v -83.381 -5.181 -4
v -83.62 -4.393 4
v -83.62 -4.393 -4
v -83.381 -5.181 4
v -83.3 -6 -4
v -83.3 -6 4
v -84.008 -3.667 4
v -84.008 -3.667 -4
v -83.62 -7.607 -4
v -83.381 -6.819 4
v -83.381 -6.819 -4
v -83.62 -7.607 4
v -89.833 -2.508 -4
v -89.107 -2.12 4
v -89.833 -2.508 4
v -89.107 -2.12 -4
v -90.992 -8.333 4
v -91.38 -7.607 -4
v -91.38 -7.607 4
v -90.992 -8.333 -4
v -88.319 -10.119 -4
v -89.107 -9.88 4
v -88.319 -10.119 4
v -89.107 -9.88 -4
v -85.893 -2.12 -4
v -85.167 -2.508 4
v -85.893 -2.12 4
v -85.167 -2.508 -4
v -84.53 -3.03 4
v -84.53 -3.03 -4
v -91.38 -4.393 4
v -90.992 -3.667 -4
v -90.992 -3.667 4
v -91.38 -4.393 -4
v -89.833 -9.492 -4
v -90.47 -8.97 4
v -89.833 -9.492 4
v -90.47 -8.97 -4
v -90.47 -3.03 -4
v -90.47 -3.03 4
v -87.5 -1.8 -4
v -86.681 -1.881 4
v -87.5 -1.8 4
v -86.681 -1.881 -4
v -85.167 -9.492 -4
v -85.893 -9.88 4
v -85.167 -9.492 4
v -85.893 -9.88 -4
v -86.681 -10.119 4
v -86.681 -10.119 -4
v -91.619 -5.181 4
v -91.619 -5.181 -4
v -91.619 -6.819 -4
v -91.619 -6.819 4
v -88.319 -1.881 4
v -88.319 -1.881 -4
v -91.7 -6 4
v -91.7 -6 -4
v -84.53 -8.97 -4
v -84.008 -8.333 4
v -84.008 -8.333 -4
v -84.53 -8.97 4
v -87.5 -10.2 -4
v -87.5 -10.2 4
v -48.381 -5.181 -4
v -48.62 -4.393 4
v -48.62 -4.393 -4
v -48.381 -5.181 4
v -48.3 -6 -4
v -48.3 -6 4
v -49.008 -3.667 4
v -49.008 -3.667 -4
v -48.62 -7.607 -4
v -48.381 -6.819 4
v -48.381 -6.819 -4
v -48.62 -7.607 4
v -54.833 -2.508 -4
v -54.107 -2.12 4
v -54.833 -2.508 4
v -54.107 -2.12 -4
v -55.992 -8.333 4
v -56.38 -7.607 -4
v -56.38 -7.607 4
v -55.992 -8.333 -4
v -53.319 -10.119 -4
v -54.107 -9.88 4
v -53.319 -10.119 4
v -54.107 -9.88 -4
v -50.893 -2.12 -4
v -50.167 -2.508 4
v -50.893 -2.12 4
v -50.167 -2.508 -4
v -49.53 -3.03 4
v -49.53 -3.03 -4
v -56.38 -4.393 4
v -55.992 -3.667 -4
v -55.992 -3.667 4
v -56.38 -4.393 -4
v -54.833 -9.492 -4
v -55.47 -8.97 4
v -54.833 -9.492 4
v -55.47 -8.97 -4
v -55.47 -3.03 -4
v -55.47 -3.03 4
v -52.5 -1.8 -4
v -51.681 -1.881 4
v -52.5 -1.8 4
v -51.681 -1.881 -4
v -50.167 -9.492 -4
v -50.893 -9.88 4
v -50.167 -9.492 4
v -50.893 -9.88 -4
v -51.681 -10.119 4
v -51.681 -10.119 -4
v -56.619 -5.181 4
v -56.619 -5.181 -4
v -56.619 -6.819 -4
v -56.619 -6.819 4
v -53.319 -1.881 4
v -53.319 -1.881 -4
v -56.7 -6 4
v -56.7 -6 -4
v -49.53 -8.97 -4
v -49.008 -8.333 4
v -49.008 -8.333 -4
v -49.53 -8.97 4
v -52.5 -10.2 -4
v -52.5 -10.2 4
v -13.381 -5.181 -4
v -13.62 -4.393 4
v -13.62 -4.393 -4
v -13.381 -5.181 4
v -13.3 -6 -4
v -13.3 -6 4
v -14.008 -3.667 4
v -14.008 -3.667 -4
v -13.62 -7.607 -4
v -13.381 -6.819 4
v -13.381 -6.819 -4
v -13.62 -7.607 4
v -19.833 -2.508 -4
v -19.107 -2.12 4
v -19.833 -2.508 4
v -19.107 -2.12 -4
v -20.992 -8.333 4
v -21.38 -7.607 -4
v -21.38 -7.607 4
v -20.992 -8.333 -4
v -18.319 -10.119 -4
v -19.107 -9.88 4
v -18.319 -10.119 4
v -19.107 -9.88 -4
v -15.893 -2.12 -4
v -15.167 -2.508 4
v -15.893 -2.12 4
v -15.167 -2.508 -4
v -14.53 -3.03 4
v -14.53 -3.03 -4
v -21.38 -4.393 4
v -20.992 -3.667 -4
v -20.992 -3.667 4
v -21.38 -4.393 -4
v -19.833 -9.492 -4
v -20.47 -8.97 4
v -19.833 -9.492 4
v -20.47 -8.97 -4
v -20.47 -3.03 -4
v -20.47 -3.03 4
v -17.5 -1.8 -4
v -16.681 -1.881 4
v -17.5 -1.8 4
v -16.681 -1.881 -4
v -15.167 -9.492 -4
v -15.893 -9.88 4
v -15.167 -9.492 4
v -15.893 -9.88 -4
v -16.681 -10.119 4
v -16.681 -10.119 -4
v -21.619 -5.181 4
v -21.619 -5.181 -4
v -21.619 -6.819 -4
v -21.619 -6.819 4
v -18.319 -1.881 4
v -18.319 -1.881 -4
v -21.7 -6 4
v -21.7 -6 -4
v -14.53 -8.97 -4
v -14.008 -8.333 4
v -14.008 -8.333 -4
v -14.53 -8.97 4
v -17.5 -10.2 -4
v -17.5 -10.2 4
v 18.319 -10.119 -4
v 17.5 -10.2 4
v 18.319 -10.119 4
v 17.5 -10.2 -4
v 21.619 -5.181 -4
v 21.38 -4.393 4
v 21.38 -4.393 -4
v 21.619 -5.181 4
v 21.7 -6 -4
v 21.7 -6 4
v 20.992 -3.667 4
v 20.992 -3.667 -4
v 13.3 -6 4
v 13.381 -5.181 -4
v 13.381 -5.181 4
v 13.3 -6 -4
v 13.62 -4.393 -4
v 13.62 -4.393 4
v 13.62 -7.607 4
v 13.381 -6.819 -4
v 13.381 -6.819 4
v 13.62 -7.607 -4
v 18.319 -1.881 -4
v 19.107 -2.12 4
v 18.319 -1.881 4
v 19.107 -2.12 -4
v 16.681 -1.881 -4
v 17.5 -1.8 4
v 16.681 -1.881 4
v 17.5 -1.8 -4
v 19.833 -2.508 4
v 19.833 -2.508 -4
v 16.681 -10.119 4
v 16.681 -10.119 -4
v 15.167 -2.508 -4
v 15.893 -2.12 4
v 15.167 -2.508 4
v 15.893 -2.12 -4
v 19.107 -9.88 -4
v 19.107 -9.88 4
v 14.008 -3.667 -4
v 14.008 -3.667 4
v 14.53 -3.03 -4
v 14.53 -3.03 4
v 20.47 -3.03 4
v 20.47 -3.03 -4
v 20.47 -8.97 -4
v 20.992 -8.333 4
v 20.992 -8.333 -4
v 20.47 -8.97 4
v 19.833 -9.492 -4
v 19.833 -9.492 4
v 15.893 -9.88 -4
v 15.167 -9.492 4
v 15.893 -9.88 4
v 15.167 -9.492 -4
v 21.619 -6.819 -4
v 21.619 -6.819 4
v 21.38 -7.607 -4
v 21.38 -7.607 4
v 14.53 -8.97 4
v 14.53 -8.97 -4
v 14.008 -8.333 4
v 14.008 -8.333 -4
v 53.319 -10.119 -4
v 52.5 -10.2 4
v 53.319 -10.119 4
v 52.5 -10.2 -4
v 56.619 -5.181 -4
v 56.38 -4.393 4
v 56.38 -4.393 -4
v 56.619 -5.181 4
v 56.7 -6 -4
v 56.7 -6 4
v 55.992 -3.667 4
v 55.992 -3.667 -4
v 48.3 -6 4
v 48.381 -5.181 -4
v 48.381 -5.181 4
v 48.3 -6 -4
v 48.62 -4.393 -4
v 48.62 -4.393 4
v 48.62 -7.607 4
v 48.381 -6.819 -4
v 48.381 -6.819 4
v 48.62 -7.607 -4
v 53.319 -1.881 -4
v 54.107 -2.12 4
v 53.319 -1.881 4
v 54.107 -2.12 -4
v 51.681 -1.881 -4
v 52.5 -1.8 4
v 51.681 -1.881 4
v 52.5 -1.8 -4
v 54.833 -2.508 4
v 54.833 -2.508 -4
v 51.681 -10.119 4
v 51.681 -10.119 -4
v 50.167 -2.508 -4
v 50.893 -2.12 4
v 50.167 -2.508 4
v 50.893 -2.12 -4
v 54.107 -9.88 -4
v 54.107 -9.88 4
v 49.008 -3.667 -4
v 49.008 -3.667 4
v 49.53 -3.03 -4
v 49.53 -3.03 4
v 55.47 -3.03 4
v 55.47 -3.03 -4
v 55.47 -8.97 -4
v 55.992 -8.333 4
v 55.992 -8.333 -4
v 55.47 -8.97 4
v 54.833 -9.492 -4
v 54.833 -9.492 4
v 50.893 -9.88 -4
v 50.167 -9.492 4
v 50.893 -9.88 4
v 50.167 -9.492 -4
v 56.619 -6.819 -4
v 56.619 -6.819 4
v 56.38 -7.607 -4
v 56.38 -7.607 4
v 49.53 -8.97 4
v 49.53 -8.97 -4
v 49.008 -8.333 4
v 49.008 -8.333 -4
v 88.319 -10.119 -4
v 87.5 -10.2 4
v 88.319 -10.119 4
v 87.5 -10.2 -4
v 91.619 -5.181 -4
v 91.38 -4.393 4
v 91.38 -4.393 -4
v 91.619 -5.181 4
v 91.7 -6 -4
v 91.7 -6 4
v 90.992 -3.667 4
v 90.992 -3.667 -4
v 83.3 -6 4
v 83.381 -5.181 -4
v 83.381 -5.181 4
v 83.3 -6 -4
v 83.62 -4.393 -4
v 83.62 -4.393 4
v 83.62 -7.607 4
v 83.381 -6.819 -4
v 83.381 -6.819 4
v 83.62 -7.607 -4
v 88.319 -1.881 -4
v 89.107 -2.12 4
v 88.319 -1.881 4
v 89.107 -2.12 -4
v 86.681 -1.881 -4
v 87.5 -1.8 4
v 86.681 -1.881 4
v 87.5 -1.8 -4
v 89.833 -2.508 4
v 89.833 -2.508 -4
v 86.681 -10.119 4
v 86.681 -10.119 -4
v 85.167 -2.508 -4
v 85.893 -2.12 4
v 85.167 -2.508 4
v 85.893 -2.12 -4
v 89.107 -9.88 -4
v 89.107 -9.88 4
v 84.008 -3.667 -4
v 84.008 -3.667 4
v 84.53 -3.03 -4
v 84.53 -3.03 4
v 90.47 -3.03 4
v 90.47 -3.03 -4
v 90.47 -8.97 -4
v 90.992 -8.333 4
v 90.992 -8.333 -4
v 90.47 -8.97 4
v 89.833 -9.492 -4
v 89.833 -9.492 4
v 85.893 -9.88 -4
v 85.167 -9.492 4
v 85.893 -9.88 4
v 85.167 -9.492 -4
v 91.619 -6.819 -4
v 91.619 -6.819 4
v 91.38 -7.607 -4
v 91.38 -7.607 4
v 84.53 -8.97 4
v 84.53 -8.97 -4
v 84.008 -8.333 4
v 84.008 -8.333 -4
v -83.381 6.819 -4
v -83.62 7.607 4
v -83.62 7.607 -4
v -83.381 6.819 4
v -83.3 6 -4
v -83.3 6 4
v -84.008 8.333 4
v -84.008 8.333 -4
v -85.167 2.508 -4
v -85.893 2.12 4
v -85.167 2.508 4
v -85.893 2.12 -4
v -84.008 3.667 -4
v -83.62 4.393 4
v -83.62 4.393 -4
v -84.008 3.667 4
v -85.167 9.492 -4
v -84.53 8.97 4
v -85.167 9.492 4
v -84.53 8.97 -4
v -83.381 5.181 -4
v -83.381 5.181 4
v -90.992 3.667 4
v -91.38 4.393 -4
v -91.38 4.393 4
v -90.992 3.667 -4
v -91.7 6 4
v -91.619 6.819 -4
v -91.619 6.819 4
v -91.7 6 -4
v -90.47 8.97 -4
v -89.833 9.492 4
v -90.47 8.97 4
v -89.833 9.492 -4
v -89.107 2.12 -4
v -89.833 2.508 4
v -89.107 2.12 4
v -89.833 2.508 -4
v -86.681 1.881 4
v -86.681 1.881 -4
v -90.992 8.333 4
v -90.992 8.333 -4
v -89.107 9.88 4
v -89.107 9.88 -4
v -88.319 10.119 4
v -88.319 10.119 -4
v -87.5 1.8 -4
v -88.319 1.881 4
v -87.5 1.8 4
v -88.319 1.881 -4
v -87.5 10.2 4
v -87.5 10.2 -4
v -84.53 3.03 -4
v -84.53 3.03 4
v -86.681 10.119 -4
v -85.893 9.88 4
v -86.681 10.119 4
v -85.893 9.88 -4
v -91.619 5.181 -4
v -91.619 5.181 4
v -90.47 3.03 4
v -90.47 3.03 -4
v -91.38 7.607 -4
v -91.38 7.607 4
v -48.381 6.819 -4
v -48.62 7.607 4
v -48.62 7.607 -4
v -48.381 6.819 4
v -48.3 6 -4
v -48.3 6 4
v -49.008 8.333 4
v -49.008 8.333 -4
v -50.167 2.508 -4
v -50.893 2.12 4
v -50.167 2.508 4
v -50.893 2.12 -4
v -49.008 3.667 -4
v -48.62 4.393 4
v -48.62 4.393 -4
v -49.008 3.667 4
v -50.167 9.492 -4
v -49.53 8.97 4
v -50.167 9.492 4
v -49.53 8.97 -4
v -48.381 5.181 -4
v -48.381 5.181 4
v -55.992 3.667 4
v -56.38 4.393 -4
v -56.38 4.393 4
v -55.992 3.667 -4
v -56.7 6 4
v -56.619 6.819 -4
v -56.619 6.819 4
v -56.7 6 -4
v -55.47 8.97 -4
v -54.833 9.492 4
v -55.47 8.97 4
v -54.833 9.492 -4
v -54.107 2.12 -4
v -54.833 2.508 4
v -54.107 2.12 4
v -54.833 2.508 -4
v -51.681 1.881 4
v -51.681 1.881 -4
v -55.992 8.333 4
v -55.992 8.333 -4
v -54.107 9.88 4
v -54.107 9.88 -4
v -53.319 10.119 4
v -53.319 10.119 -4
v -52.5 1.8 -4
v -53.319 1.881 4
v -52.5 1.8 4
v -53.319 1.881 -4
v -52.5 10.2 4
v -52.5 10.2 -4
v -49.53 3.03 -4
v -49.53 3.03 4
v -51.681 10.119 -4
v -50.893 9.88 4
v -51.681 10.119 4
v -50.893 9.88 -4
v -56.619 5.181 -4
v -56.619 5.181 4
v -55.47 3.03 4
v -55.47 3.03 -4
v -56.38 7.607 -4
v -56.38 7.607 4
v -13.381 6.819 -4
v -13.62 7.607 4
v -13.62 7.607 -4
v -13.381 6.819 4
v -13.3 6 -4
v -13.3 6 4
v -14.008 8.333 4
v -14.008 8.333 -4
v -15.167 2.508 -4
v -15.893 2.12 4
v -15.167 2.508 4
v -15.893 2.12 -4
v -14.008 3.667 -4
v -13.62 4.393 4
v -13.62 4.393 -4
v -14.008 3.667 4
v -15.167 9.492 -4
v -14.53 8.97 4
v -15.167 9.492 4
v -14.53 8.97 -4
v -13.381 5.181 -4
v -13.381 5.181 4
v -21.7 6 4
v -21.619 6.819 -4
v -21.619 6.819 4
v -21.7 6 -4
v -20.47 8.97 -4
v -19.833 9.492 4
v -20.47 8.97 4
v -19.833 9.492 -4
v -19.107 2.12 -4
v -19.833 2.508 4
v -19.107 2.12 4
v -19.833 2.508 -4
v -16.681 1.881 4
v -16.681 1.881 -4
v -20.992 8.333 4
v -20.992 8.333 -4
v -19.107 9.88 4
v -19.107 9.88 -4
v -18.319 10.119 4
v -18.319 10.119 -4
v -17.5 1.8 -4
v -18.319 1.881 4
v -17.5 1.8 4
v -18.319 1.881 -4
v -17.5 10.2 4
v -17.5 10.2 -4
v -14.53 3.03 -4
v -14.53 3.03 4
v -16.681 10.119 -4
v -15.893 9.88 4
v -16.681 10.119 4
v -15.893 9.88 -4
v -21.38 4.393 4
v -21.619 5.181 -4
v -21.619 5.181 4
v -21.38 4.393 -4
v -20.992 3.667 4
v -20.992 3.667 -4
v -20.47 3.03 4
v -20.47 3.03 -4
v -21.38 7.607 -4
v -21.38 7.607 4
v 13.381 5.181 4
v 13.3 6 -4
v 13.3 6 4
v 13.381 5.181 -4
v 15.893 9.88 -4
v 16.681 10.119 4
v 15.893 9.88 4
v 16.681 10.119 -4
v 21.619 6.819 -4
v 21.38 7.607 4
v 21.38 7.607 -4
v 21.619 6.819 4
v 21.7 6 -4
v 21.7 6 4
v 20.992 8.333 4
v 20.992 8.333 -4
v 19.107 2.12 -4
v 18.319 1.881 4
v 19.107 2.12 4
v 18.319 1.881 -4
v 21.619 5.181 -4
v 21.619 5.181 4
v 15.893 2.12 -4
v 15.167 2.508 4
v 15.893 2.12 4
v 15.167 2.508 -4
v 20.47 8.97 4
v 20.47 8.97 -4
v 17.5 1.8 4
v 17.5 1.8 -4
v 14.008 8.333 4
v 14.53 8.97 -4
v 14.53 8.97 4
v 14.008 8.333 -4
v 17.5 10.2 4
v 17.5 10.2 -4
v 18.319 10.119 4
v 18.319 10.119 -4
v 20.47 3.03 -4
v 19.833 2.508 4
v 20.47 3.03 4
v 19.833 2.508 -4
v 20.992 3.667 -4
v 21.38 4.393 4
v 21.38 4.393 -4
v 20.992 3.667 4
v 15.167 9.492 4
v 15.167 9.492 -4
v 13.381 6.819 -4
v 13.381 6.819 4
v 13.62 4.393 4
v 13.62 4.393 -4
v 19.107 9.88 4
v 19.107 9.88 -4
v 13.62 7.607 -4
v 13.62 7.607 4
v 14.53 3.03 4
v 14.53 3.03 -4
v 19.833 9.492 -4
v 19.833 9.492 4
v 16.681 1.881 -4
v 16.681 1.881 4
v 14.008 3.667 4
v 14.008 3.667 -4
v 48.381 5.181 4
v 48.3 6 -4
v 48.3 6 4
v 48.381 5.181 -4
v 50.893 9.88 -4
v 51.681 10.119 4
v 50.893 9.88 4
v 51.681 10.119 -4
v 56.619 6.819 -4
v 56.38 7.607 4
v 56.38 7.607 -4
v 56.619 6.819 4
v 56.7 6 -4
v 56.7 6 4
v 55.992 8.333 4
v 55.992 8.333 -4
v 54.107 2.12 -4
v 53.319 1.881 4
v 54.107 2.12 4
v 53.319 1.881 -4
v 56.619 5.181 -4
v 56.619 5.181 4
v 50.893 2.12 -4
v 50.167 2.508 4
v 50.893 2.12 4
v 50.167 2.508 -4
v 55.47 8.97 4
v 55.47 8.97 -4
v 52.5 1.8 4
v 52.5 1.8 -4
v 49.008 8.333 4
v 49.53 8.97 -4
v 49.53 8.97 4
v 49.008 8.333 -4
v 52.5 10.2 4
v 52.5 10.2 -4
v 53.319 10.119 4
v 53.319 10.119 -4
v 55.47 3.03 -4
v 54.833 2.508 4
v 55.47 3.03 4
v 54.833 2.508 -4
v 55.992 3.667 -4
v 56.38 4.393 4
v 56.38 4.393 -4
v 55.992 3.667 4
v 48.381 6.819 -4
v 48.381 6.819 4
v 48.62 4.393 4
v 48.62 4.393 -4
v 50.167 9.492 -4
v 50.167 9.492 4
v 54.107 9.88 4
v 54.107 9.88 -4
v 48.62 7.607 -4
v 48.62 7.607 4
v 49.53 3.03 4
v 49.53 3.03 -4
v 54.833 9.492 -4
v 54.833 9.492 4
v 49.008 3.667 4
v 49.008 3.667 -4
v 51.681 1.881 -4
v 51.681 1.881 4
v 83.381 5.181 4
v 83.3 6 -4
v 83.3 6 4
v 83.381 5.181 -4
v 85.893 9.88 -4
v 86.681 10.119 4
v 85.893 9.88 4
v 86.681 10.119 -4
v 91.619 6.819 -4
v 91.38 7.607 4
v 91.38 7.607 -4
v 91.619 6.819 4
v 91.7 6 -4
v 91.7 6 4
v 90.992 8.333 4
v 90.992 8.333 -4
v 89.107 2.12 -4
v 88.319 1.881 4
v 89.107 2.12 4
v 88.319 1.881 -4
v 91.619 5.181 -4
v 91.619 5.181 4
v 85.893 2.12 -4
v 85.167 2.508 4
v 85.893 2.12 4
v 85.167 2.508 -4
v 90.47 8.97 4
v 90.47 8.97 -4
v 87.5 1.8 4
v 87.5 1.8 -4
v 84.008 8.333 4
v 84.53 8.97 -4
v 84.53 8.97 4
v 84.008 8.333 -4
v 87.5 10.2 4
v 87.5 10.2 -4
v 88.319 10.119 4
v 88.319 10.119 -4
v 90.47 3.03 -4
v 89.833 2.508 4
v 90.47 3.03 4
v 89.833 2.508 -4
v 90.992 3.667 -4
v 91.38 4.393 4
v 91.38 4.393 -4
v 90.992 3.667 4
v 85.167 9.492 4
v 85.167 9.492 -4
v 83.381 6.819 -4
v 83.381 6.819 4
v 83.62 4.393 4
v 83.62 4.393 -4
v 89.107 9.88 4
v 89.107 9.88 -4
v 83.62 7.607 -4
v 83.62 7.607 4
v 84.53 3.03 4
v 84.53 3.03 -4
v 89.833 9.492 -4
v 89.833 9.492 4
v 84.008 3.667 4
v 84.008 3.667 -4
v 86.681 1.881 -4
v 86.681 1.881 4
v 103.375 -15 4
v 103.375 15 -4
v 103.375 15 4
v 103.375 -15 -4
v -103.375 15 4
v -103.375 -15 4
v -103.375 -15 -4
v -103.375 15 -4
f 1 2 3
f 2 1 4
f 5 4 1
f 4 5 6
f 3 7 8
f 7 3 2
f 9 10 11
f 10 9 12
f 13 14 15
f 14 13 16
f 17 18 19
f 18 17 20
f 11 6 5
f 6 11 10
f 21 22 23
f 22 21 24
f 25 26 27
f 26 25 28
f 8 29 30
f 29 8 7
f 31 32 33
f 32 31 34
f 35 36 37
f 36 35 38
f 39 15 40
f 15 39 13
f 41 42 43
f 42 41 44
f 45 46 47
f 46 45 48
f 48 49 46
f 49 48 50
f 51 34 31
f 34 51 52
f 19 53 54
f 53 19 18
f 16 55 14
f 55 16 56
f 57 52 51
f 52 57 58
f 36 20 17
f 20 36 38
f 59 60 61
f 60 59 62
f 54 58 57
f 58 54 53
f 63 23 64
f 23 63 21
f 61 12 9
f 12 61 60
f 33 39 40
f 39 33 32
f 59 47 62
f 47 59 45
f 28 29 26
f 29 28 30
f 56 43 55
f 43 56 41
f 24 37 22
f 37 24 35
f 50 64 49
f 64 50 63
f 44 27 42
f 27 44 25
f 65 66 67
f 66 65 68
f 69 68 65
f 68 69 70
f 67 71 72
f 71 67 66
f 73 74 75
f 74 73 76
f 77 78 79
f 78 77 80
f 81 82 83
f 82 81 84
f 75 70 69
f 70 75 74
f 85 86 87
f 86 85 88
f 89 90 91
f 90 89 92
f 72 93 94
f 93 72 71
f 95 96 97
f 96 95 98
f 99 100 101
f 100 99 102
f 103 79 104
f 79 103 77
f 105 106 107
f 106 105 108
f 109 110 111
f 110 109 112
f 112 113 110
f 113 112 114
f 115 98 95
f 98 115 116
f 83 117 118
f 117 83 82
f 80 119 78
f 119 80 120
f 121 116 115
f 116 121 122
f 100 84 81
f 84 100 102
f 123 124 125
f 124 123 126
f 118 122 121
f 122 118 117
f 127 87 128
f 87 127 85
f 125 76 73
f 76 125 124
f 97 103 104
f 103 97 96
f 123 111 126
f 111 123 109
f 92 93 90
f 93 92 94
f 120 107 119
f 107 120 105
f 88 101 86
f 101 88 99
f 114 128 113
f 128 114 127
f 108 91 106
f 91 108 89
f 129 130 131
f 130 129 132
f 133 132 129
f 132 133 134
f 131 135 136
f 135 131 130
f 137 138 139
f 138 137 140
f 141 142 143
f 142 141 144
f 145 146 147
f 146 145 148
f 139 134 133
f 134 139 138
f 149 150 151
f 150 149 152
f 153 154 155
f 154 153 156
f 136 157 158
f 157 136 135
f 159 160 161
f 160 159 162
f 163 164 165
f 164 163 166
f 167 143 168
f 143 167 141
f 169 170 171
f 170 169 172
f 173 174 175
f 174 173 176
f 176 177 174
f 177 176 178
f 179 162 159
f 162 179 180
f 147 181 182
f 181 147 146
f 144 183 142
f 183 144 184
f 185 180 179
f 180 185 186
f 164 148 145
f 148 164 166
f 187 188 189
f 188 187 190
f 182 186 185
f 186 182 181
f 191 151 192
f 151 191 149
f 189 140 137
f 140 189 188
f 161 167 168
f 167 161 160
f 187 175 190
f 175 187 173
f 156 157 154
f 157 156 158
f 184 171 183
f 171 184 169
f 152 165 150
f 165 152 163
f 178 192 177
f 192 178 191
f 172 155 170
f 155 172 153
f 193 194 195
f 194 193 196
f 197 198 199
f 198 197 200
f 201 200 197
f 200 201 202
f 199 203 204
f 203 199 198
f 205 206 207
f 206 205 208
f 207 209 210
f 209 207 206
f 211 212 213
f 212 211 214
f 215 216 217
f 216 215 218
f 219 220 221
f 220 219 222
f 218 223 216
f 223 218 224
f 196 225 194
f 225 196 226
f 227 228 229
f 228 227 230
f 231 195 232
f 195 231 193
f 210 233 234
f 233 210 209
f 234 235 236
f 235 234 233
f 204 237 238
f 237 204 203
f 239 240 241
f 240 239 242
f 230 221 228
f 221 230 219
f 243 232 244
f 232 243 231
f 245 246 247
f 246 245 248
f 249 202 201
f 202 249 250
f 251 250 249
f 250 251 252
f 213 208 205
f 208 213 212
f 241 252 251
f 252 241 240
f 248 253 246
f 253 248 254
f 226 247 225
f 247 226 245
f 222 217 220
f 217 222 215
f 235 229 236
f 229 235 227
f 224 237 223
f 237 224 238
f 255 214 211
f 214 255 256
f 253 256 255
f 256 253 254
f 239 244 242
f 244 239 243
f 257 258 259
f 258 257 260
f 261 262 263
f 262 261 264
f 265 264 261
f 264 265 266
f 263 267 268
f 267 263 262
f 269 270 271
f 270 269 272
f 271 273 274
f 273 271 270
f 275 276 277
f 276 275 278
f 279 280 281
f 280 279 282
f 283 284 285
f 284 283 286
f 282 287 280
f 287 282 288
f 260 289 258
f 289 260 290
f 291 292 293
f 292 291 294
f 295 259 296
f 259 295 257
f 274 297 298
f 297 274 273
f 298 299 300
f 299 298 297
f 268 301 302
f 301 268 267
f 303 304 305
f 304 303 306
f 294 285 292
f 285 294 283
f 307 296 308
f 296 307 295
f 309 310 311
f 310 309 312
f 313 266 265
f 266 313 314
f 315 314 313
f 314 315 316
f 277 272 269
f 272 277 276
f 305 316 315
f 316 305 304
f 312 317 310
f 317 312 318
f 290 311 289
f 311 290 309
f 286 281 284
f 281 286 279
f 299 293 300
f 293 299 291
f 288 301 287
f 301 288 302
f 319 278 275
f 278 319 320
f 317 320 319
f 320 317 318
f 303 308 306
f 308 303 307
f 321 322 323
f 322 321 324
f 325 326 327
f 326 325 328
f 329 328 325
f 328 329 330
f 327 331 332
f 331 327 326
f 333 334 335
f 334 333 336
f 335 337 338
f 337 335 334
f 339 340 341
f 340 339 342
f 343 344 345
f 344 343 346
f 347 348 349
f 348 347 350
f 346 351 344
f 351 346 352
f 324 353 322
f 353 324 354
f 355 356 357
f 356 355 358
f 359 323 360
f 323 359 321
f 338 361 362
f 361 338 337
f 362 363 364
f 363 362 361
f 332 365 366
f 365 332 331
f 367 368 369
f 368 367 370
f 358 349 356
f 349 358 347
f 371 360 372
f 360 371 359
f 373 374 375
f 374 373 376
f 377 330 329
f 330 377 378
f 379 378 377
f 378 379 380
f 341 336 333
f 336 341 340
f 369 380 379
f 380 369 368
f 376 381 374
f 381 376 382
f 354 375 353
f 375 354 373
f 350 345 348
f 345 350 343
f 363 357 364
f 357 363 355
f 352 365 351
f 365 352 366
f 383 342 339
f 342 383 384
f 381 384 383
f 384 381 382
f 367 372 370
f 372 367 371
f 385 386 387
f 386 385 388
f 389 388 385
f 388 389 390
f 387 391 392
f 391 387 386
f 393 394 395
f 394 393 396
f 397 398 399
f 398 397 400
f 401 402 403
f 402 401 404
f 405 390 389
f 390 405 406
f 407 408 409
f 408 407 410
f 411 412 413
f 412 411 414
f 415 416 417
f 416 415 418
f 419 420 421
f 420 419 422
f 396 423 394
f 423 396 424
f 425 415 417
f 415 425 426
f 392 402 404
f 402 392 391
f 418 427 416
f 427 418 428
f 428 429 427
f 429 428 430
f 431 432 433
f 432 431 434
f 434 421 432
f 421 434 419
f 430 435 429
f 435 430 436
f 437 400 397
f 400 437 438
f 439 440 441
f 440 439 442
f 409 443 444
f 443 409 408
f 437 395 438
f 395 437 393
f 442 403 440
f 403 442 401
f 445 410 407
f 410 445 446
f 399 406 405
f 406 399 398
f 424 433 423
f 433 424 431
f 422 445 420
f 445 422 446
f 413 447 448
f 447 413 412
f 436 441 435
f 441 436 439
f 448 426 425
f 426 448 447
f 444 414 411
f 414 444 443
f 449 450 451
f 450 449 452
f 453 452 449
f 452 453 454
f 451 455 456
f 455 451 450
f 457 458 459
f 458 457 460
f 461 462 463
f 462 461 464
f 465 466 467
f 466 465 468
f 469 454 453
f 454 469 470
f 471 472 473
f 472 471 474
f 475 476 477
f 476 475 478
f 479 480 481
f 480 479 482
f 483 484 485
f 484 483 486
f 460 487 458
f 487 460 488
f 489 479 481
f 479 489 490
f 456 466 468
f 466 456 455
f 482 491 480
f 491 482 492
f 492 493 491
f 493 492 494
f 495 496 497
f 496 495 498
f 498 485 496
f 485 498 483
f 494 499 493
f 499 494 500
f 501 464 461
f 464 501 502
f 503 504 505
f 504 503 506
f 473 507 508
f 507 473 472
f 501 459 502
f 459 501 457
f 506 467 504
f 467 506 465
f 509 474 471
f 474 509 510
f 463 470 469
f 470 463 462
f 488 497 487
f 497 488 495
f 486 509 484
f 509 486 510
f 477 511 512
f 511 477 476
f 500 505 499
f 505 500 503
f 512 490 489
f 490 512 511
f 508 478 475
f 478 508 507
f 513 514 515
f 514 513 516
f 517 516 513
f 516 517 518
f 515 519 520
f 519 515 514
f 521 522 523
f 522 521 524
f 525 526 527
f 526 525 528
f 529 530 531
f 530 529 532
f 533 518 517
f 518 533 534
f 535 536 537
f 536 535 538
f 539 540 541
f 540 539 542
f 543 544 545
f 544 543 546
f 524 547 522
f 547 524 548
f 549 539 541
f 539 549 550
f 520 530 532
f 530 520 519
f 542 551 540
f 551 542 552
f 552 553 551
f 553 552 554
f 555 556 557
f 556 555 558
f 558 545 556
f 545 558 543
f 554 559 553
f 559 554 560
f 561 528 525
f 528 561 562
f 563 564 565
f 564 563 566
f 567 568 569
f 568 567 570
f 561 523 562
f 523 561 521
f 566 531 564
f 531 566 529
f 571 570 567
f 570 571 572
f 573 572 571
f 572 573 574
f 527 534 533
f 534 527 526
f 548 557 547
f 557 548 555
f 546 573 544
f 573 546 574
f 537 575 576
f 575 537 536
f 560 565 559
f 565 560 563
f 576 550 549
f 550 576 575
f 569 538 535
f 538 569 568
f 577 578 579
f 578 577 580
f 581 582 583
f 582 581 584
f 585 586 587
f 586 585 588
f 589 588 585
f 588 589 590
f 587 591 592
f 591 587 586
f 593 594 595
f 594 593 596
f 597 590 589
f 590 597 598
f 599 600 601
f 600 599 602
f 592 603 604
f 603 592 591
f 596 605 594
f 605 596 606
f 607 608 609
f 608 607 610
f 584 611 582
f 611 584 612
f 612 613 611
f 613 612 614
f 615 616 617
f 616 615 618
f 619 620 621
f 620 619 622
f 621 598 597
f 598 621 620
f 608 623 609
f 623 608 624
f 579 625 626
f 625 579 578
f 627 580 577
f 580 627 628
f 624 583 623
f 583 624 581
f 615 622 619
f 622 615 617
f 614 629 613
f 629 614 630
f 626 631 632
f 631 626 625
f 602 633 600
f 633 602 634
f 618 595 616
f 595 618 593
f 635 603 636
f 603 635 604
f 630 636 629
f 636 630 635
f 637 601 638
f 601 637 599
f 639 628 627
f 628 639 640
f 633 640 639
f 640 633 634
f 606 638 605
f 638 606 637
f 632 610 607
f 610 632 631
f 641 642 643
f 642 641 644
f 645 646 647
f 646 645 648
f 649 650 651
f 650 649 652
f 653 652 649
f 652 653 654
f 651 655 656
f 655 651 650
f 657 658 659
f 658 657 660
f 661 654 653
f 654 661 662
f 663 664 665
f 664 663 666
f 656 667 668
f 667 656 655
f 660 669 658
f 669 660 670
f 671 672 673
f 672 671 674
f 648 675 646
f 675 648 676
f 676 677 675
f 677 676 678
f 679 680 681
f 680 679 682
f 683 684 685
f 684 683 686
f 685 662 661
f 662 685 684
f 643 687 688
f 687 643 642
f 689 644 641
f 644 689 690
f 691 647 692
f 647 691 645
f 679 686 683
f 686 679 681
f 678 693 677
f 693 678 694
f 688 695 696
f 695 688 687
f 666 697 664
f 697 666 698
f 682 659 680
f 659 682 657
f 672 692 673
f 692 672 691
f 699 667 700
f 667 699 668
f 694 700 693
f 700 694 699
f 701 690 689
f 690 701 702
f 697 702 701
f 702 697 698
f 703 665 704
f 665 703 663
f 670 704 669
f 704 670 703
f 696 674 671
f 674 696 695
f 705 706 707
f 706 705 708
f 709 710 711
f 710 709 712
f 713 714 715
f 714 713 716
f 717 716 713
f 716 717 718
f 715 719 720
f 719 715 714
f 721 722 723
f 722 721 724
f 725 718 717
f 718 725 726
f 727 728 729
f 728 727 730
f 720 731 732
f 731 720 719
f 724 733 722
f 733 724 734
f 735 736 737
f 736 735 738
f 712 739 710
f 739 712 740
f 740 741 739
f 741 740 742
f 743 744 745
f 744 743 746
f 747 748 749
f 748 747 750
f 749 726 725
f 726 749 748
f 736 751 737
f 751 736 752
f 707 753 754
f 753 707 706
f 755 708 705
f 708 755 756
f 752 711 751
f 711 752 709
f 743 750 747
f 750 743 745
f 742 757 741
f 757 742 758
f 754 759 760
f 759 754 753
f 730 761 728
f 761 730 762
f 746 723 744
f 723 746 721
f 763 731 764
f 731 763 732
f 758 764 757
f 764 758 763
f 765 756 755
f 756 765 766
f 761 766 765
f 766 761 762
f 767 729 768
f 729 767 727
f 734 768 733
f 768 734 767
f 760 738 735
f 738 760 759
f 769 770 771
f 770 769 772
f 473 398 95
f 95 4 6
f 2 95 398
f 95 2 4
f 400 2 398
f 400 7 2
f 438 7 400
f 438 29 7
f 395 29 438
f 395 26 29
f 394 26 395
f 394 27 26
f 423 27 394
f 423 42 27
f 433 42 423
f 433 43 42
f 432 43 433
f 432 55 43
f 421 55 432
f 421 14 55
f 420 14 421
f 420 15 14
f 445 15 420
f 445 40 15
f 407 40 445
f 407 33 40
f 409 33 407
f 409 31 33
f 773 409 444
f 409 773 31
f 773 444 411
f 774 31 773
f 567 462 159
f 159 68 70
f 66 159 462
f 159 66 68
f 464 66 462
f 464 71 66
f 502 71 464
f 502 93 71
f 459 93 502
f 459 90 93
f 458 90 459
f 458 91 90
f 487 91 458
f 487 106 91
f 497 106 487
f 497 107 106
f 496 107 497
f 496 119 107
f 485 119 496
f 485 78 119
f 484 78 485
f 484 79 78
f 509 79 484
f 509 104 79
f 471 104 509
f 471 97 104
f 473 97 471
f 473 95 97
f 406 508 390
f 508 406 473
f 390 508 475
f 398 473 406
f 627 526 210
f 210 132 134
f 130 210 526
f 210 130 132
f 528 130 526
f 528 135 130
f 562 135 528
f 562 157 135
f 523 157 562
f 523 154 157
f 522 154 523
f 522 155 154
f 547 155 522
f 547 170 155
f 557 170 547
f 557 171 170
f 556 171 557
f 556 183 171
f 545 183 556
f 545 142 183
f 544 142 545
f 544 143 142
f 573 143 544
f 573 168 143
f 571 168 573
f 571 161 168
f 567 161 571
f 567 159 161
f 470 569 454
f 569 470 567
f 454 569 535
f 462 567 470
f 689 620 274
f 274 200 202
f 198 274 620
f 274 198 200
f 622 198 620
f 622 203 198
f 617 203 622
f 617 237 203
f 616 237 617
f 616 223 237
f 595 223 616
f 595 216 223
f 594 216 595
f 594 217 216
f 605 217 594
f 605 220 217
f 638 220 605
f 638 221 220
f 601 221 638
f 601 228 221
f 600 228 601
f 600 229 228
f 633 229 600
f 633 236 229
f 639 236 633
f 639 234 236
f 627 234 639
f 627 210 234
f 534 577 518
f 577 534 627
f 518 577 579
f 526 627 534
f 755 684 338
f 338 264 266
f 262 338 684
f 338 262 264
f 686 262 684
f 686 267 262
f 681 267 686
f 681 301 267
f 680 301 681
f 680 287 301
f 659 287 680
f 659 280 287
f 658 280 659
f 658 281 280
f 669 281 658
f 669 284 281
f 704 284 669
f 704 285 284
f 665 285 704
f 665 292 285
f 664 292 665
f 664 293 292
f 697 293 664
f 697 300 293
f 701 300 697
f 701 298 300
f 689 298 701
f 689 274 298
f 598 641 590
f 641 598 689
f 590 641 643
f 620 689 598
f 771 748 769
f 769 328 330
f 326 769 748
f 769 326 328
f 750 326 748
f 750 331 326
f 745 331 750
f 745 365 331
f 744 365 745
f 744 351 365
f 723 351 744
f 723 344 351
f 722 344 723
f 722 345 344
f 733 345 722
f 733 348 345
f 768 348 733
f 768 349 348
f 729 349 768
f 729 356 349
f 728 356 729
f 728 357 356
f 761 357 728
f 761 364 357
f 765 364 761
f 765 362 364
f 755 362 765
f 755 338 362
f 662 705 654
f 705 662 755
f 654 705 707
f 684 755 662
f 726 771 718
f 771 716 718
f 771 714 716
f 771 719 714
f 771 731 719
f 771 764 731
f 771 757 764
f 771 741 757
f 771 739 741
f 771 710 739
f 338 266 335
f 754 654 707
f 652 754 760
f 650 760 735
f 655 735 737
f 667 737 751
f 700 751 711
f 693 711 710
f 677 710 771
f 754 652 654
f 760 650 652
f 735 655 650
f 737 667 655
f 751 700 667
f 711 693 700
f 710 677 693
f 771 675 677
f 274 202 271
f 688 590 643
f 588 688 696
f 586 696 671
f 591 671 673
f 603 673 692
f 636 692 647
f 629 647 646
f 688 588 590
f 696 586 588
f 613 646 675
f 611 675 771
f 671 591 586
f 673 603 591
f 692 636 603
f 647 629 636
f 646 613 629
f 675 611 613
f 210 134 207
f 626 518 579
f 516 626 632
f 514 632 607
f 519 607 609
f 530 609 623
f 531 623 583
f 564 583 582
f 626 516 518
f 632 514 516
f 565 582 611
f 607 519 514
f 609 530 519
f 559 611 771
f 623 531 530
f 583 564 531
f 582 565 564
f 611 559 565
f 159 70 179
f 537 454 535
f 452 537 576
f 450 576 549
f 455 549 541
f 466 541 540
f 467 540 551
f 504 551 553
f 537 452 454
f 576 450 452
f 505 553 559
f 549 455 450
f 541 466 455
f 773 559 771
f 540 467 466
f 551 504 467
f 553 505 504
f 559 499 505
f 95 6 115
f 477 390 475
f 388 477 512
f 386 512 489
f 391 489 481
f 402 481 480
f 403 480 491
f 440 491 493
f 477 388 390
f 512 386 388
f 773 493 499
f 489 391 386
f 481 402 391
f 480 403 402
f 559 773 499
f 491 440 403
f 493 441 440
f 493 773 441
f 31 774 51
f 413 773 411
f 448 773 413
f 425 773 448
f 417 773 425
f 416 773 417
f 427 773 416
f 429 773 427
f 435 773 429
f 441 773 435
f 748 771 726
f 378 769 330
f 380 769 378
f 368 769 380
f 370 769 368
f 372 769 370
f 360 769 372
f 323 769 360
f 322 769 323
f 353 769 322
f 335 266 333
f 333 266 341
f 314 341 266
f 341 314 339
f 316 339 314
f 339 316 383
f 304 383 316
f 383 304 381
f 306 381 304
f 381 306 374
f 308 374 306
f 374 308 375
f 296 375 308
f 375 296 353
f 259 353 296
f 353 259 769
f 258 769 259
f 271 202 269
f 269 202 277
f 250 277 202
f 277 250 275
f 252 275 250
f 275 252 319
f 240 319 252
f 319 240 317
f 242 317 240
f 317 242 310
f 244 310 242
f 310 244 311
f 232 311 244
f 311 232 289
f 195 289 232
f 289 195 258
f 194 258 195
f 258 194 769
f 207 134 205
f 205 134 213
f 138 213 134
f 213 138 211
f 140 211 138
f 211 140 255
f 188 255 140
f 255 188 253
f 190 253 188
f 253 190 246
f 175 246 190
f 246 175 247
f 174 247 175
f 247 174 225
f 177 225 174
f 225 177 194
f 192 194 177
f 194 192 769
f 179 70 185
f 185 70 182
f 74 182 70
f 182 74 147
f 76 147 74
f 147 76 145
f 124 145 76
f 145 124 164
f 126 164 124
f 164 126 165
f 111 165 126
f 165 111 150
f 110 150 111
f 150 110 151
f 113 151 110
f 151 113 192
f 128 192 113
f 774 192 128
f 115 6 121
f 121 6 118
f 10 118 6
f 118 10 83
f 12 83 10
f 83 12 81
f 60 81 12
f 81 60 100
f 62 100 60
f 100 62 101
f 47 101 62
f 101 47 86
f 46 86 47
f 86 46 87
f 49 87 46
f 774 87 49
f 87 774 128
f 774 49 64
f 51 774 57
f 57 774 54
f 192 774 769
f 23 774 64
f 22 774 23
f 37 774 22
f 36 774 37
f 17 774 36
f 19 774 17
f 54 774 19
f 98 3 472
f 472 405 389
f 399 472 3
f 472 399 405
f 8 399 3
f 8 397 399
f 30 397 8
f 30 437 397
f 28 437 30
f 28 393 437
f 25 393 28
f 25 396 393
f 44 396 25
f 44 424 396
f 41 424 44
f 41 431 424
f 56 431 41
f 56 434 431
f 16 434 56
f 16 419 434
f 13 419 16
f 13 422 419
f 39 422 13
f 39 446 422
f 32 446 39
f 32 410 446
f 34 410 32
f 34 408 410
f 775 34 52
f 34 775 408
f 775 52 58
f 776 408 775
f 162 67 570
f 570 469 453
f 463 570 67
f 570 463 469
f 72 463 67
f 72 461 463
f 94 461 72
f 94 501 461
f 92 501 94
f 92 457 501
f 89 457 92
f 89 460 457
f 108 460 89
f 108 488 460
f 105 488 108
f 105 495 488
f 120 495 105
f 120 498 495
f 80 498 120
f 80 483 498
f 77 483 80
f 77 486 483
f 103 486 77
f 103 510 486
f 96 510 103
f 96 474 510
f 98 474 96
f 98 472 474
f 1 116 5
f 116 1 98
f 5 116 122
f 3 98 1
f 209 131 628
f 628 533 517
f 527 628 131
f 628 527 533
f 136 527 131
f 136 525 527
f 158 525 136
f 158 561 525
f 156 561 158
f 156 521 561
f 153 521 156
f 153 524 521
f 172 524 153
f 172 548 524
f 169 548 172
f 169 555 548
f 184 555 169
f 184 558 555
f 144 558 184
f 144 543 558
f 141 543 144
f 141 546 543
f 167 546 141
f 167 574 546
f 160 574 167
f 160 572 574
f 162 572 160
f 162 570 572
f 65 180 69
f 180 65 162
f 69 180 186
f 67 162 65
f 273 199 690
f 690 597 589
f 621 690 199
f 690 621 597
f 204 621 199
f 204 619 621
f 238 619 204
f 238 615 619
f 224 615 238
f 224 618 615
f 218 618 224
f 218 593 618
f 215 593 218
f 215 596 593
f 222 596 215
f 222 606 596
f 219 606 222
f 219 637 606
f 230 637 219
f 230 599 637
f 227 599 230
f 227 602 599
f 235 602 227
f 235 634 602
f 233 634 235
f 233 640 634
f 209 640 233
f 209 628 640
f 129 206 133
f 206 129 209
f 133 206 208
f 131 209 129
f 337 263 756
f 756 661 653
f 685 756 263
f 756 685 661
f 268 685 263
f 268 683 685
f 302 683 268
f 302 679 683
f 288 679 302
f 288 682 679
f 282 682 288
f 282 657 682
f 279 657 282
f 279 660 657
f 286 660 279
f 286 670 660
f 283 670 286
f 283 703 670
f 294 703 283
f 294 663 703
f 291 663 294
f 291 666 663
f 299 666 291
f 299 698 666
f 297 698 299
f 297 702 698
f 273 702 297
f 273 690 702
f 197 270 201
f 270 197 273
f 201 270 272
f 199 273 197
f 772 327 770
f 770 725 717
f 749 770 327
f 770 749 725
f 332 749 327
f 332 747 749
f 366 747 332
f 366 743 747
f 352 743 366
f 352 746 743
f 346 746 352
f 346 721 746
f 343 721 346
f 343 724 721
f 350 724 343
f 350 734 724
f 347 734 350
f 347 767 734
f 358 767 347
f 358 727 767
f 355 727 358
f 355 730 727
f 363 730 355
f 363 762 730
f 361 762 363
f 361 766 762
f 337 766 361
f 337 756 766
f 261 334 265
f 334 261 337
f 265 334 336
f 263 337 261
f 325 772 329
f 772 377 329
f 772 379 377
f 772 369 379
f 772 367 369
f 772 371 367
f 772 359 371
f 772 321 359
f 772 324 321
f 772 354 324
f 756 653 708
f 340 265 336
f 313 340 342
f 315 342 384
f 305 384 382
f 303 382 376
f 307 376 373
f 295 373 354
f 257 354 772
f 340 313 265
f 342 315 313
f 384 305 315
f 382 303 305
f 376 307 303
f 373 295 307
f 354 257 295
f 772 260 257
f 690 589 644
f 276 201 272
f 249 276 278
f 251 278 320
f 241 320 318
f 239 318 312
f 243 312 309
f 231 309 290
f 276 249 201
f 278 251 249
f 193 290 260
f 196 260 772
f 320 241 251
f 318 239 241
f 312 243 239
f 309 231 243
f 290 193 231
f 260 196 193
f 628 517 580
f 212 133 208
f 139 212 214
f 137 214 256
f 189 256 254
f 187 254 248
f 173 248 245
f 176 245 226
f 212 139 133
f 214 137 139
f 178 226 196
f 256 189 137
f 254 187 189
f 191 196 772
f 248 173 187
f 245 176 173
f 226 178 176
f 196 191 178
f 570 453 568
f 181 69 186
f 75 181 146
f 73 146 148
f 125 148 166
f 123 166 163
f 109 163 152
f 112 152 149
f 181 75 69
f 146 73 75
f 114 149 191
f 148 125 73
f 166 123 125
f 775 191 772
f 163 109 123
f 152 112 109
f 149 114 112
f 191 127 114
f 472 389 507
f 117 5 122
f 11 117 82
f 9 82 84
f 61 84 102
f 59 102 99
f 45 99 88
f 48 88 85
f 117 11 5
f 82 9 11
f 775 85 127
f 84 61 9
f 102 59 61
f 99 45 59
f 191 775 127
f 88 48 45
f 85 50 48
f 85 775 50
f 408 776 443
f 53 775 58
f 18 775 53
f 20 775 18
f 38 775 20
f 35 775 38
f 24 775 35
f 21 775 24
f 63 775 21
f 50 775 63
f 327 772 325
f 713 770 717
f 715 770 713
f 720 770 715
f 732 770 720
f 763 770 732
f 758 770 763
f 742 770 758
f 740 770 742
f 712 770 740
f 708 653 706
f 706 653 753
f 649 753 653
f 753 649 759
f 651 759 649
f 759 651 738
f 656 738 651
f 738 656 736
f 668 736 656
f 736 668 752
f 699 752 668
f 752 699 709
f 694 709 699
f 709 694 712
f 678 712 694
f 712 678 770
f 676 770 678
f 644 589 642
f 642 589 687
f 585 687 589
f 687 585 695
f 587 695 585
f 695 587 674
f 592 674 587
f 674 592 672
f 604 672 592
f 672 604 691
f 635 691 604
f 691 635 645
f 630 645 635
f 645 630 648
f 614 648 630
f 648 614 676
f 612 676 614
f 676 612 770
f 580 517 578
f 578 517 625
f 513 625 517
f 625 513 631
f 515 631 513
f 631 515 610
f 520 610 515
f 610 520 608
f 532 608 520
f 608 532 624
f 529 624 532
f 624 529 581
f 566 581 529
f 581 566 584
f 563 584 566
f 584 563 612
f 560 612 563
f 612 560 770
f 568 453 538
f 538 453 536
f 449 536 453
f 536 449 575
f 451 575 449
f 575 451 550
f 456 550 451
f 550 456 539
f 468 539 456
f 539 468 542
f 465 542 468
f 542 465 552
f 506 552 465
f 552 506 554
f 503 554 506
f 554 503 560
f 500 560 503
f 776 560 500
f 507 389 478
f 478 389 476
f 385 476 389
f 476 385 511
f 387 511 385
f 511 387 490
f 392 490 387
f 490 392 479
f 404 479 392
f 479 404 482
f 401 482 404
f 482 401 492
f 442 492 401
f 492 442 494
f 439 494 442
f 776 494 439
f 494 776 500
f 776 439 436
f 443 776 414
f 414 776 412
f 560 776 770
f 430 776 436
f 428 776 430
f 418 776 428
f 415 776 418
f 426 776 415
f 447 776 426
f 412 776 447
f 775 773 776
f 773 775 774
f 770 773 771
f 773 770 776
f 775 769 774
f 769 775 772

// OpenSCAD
$fn = 32;

// ----------------------------------------------------------------------
// Hole bar, 6 x Ø8.4
// tworows layout, 15.875 mm edge offset
// ----------------------------------------------------------------------

// --- parameters (mm) ---
bar_w = 30;       // bar width (Y)
bar_t = 8;        // bar thickness (Z)
holes = 6;        // holes per row
hole_d = 8.4;     // hole diameter
edge = 15.875;    // offset from the bar end to the first hole
pitch = 35;       // pitch between neighbouring holes
row_offset = 12;  // distance between the two rows

// --- derived feature positions (mm) ---
span = (holes - 1) * pitch;   // = 175   distance between the end holes
bar_l = span + 2 * edge;      // = 206.75   overall bar length
start_x = -bar_l / 2 + edge;  // = -87.5   X of the first hole
feature_centers = [
  [start_x + 0 * pitch, -row_offset / 2],
  [start_x + 1 * pitch, -row_offset / 2],
  [start_x + 2 * pitch, -row_offset / 2],
  [start_x + 3 * pitch, -row_offset / 2],
  [start_x + 4 * pitch, -row_offset / 2],
  [start_x + 5 * pitch, -row_offset / 2]
];   // hole centres of the first row
row2_centers = [
  [start_x + 0 * pitch, row_offset / 2],
  [start_x + 1 * pitch, row_offset / 2],
  [start_x + 2 * pitch, row_offset / 2],
  [start_x + 3 * pitch, row_offset / 2],
  [start_x + 4 * pitch, row_offset / 2],
  [start_x + 5 * pitch, row_offset / 2]
];   // hole centres of the second row

// bar with two rows of holes, both read from their own centre arrays
difference() {
  translate([-bar_l / 2, -bar_w / 2, -bar_t / 2]) cube([bar_l, bar_w, bar_t]);
  for (centre = feature_centers)
    translate([centre[0], centre[1], 0])
      cylinder(d = hole_d, h = bar_t + 2, center = true);
  for (centre = row2_centers)
    translate([centre[0], centre[1], 0])
      cylinder(d = hole_d, h = bar_t + 2, center = true);
}
